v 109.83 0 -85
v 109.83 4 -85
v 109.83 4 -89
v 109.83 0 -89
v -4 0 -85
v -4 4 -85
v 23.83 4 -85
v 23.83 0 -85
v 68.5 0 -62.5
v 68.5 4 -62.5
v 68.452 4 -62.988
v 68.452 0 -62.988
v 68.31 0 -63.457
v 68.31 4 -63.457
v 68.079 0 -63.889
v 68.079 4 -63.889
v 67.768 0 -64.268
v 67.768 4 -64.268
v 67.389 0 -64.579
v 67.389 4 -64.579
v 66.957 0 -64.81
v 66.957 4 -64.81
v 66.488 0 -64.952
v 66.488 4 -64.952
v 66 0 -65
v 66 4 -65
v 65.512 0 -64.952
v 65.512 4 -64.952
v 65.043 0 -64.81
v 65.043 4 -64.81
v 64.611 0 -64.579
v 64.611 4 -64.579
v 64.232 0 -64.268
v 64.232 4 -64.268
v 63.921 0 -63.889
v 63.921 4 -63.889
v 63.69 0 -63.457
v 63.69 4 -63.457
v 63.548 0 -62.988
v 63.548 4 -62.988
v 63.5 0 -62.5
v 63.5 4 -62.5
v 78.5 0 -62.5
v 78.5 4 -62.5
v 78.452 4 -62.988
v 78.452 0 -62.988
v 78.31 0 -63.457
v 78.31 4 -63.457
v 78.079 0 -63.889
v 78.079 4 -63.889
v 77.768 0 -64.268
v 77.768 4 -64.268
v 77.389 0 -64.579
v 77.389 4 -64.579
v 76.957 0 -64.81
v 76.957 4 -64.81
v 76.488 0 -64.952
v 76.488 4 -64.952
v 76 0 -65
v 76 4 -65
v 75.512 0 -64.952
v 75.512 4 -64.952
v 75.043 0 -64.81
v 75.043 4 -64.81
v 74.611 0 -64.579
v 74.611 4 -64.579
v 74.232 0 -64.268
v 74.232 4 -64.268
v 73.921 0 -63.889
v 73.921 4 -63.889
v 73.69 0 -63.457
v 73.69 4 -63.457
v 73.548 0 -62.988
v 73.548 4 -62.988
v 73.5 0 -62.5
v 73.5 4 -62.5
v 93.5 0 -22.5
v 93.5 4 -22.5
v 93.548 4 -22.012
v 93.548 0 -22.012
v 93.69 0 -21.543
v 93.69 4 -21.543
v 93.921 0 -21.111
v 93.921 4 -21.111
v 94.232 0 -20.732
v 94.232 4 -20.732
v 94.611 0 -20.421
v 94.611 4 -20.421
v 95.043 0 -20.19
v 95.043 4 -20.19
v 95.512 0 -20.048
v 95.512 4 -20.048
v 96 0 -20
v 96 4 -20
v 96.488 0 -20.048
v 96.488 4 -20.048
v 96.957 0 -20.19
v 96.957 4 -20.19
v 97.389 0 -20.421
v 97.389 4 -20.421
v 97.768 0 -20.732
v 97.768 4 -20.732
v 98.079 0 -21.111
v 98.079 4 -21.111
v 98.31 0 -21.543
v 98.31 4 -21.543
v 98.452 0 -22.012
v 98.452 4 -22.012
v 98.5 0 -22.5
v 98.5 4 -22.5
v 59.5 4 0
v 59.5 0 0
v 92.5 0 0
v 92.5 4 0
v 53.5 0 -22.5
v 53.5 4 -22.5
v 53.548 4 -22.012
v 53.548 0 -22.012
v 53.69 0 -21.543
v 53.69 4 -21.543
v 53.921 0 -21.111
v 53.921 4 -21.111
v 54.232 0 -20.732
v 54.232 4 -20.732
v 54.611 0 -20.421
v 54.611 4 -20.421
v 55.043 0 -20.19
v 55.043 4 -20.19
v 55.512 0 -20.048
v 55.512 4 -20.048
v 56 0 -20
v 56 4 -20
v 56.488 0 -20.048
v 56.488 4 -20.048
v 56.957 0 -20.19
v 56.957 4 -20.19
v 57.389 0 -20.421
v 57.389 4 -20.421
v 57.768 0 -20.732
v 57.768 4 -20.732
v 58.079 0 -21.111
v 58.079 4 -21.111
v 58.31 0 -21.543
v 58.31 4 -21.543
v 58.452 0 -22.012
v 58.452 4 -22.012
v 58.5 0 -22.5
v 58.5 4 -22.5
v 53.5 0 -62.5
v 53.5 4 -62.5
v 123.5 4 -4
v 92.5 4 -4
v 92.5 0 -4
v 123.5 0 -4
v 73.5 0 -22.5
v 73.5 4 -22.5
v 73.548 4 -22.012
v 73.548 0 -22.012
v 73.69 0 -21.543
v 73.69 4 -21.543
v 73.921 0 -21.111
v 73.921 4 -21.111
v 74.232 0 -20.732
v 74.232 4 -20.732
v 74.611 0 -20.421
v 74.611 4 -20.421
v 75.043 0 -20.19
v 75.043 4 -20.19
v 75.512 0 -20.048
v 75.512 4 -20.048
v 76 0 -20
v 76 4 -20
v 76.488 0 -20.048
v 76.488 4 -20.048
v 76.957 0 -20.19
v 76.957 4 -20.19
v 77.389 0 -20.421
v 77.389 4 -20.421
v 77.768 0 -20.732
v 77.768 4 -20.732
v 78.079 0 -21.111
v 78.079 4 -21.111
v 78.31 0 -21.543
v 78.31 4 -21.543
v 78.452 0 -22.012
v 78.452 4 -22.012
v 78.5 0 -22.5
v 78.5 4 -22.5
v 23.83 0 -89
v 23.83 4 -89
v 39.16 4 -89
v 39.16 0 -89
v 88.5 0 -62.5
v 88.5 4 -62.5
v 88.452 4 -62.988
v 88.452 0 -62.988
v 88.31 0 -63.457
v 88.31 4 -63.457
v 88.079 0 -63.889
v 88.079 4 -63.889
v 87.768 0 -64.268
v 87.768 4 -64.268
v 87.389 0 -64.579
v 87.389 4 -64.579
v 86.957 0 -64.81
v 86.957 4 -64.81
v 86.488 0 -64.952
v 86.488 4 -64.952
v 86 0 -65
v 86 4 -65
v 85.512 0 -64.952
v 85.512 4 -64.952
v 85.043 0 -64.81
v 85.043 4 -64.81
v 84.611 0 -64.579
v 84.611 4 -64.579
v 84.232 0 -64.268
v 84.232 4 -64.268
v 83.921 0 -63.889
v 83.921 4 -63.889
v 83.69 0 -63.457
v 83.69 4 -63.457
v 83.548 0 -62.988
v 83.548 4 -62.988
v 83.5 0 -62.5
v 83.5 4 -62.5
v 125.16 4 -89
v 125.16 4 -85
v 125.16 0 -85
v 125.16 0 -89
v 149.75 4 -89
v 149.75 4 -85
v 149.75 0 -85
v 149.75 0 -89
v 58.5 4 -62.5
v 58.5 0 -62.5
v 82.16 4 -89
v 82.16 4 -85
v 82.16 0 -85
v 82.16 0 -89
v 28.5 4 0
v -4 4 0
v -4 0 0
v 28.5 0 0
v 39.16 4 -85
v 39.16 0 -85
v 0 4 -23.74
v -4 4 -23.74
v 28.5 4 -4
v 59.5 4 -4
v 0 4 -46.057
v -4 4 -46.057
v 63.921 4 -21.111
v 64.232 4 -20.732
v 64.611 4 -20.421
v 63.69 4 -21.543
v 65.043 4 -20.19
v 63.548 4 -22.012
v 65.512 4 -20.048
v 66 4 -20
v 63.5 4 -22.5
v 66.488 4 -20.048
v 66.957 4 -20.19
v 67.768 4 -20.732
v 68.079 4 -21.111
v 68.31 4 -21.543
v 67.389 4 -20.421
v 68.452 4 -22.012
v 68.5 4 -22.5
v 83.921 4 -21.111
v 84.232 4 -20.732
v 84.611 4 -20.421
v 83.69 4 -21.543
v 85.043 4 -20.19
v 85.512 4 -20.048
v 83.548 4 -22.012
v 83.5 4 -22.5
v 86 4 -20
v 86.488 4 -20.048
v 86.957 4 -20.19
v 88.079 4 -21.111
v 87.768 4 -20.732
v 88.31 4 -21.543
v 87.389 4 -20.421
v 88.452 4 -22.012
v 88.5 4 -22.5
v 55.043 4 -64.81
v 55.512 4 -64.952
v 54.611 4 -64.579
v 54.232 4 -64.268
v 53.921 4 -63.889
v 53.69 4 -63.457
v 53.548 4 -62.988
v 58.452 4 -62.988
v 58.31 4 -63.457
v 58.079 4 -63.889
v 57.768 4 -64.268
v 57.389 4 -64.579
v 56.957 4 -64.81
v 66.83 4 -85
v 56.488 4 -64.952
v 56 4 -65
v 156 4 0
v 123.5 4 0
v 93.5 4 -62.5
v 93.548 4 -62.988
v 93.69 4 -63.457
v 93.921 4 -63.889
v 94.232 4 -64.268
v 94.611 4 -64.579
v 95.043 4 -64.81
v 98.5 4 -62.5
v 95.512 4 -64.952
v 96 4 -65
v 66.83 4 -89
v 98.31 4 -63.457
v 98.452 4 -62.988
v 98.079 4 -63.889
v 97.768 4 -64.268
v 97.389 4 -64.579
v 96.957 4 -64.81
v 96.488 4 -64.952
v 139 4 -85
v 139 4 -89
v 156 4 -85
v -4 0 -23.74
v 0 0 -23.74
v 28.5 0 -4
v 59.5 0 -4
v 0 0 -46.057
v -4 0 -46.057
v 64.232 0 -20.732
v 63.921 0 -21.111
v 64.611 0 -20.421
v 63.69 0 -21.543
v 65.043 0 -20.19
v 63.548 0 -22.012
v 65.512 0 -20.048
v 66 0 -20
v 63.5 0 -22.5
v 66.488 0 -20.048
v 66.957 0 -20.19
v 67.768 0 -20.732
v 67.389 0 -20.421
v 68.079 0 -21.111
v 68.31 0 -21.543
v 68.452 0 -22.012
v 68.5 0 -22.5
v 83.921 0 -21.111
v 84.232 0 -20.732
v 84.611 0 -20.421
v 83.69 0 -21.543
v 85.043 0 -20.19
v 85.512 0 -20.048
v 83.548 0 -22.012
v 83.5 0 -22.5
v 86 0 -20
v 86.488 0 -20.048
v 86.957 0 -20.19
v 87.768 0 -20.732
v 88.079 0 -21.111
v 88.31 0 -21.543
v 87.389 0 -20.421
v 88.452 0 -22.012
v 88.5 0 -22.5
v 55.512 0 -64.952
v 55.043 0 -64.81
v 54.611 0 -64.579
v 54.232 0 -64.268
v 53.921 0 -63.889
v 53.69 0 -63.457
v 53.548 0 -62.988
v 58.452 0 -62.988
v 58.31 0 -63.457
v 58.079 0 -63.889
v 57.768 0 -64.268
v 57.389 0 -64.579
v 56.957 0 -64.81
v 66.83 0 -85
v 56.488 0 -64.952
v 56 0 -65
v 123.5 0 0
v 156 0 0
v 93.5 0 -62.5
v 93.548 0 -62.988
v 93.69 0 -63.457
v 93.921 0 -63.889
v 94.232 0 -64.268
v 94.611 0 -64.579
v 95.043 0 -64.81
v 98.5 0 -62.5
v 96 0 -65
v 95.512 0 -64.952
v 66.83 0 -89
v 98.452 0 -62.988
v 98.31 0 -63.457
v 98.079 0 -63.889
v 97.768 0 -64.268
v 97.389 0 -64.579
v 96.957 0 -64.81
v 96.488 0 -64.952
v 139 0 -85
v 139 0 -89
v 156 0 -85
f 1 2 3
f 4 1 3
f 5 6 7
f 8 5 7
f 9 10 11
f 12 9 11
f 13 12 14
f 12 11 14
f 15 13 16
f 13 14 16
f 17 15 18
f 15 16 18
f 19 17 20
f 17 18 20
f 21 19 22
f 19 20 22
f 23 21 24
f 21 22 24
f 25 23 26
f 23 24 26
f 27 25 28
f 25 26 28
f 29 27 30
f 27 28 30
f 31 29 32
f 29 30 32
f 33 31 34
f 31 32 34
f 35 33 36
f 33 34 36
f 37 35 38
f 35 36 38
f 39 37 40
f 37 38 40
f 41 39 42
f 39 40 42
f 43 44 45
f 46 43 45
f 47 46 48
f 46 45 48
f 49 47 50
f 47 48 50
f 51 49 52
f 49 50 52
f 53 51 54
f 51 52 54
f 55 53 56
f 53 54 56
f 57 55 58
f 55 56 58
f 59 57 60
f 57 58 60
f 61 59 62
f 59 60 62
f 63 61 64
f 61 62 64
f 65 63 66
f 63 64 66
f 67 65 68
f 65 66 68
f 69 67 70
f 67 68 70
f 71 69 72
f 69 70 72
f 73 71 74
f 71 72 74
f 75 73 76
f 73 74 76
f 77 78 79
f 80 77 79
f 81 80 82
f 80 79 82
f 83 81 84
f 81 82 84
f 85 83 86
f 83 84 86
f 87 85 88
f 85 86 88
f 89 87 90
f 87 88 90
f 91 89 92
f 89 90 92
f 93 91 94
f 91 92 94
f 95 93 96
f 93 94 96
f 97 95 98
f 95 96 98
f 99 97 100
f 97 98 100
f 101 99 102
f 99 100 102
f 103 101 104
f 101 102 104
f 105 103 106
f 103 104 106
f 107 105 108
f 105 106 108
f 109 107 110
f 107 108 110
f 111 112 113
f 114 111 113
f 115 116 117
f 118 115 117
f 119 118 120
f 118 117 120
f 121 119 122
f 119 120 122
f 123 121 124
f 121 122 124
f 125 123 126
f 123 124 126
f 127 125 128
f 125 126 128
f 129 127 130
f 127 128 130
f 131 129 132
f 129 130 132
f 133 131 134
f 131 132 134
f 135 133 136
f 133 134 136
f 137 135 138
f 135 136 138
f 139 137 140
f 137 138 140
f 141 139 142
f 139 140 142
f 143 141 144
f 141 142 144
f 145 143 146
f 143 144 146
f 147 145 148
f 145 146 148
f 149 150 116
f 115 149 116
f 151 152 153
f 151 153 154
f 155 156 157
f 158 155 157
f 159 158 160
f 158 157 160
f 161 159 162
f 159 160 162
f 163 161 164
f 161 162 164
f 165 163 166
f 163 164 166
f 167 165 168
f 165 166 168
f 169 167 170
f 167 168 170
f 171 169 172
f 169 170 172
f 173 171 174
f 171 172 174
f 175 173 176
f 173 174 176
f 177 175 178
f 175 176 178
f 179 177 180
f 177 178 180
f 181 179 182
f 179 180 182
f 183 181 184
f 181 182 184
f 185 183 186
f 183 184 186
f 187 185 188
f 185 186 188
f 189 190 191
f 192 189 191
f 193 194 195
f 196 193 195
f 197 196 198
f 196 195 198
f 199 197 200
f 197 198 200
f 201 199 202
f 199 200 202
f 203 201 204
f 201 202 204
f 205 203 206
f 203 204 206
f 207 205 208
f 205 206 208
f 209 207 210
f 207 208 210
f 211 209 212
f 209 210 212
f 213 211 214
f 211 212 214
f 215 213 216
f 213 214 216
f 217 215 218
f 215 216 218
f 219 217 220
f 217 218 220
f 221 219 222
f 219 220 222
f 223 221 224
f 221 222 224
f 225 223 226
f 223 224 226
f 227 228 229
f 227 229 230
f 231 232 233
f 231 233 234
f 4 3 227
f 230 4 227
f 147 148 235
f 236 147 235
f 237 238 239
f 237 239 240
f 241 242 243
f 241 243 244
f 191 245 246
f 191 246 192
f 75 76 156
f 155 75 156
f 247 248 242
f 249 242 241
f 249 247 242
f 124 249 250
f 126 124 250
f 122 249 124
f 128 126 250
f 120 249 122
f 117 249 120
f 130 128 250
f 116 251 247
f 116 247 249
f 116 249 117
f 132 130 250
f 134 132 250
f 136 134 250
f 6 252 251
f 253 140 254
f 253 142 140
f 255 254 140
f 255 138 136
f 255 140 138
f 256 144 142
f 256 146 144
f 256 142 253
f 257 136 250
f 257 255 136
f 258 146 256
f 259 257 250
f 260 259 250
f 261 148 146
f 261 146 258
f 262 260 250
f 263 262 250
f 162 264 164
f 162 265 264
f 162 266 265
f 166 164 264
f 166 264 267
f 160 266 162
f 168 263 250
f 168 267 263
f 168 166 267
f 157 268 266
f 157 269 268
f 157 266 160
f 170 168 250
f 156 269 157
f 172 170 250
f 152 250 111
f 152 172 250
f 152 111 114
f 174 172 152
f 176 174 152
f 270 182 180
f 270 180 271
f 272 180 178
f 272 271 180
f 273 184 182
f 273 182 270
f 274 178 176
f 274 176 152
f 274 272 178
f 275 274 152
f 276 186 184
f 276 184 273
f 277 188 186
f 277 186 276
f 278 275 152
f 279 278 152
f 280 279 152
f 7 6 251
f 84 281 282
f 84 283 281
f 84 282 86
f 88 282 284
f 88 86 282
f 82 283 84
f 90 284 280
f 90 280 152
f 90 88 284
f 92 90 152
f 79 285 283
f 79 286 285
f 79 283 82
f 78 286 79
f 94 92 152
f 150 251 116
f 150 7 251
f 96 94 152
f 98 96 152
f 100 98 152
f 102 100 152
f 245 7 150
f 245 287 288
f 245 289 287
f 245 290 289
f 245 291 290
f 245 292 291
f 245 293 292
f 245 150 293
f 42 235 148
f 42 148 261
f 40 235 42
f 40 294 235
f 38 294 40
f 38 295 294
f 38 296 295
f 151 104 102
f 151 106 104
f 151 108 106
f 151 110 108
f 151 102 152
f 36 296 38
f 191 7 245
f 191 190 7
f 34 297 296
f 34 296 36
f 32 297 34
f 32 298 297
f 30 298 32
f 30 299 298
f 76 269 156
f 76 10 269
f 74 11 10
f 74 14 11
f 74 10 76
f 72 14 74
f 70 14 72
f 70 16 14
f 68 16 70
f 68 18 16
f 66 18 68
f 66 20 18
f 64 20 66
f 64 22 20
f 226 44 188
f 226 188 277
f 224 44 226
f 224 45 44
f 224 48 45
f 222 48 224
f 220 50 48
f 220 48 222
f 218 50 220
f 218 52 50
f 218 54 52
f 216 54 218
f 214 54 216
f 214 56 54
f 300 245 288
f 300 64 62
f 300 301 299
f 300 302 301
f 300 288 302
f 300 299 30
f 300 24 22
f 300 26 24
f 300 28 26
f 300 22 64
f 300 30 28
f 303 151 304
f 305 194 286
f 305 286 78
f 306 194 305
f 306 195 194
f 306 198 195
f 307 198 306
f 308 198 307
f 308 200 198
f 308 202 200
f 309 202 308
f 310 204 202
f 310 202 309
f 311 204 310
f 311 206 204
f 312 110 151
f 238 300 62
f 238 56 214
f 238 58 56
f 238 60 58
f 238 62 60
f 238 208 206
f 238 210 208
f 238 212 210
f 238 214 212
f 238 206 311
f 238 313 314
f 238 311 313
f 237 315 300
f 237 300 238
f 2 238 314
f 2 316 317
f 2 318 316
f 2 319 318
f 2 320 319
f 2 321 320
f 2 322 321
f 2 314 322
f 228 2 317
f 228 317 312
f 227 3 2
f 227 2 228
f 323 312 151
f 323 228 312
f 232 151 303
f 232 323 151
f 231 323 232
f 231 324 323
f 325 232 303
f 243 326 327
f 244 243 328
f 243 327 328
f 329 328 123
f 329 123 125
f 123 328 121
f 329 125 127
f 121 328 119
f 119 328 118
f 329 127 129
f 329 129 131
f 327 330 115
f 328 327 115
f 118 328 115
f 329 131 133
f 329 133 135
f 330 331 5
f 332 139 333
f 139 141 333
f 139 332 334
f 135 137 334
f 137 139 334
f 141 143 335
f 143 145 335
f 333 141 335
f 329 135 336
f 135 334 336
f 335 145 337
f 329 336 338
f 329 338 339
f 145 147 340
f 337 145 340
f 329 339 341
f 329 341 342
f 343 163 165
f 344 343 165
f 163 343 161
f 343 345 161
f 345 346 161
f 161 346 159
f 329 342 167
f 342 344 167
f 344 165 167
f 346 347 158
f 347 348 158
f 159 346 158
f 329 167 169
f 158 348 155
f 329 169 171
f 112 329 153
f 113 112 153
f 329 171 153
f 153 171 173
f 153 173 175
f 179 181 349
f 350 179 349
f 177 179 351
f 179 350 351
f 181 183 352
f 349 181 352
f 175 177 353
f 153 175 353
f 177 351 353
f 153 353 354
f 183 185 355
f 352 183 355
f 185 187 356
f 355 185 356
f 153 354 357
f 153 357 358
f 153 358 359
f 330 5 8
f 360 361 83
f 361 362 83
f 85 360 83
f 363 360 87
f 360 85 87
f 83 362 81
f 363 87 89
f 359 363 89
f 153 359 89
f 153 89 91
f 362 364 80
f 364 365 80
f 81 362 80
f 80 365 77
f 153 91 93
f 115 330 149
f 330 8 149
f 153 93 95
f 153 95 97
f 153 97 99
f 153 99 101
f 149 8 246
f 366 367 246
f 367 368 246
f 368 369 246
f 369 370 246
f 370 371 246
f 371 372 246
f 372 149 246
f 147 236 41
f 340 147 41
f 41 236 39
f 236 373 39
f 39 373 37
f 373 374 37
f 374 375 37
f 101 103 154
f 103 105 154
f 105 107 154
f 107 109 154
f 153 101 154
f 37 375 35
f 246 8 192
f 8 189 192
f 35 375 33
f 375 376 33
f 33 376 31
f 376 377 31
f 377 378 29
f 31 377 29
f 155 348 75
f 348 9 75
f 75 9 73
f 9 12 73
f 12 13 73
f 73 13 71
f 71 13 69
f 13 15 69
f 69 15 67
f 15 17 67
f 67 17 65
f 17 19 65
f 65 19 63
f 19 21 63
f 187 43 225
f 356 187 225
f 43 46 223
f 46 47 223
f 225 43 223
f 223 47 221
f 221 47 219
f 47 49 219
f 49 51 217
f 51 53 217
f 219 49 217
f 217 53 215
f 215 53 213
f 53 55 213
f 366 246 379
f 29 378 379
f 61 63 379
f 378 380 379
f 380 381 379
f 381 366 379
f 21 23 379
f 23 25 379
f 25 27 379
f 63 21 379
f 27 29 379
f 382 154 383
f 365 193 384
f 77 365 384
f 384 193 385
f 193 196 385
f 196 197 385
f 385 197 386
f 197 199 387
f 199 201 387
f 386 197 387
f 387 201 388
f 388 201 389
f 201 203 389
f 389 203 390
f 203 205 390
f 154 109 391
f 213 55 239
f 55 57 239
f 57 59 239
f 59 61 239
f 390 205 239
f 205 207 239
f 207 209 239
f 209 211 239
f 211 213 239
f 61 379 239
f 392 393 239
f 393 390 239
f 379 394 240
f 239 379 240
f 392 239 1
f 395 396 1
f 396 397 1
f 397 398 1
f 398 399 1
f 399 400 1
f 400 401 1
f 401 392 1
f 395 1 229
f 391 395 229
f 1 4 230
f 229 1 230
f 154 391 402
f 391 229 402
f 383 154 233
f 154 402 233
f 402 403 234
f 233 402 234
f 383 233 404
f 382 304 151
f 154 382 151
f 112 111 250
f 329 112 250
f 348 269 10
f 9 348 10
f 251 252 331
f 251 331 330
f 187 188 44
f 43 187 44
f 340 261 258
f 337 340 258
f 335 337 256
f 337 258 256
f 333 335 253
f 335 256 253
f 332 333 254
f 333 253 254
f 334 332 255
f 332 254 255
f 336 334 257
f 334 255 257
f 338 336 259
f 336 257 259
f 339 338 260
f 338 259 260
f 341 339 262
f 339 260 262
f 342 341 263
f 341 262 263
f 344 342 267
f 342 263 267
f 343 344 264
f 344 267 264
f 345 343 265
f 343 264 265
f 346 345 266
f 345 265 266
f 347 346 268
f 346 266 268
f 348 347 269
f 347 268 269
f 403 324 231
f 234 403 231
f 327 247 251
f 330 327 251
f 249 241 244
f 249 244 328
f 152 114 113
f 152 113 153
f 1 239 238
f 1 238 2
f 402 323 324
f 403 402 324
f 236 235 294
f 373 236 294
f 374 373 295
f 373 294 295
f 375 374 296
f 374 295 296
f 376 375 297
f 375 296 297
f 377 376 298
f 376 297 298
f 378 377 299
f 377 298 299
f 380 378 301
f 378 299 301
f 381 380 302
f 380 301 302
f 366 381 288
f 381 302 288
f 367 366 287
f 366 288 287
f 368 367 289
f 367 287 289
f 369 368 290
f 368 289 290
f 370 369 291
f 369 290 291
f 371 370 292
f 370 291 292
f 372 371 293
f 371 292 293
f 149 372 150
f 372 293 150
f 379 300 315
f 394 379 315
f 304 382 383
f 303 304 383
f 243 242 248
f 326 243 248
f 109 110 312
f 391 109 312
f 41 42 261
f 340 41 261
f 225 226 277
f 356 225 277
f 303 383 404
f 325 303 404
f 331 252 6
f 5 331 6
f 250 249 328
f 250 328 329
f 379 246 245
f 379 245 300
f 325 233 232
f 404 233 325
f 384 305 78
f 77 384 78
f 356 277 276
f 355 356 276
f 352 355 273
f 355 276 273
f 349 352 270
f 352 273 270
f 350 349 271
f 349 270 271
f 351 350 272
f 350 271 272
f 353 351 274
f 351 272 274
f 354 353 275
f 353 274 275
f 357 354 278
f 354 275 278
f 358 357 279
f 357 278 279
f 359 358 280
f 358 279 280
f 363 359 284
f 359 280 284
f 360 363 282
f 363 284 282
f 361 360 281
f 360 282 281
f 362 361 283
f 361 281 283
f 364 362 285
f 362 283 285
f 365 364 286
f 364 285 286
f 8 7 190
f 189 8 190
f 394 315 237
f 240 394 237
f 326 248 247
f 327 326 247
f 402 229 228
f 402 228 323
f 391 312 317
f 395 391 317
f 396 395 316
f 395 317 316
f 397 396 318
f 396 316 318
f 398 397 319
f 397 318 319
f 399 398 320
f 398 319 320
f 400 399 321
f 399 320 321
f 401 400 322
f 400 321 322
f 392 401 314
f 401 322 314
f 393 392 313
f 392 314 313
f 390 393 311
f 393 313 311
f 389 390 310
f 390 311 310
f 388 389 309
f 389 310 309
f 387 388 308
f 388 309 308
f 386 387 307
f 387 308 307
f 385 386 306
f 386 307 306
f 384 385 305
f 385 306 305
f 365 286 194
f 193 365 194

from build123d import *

# Parameters (mm, degrees)
SKETCH1_W           = 156
SKETCH1_H           = 85
BOSS_EXTRUDE1_DEPTH = 4
SKETCH2_W           = 15.33
SKETCH2_H           = 4
BOSS_EXTRUDE2_DEPTH = 4
SKETCH3_W           = 31
SKETCH3_H           = 4
CUT_EXTRUDE2_DEPTH  = 4
SKETCH4_W           = 4
SKETCH4_H           = 26.74
SKETCH4_H_2         = 28.24
BOSS_EXTRUDE3_DEPTH = 4
SKETCH5_W           = 10.75
SKETCH5_H           = 4
BOSS_EXTRUDE4_DEPTH = 4
CUT_EXTRUDE3_DEPTH  = 4
SKETCH7_W           = 4
SKETCH7_H           = 8.78
SKETCH7_H_2         = 1.92320958
BOSS_EXTRUDE5_DEPTH = 4
SKETCH8_W           = 4
SKETCH8_H           = 2.999936799
CUT_EXTRUDE4_DEPTH  = 4


with BuildPart() as part:
    # Sketch1 → Boss-Extrude1 (new body)
    with BuildSketch(Plane(origin=(0, 0, 0), x_dir=(1, 0, 0), z_dir=(0, 1, 0))):
        with Locations((78, 42.5)):
            Rectangle(SKETCH1_W, SKETCH1_H)
    extrude(amount=BOSS_EXTRUDE1_DEPTH)

    # Sketch2 → Boss-Extrude2 (add)
    with BuildSketch(Plane(origin=(0, 4, 0), x_dir=(1, 0, 0), z_dir=(0, 1, 0))):
        with Locations((31.495, 87)):
            Rectangle(SKETCH2_W, SKETCH2_H)
        with Locations((74.495, 87)):
            Rectangle(SKETCH2_W, SKETCH2_H)
        with Locations((117.495, 87)):
            Rectangle(SKETCH2_W, SKETCH2_H)
    extrude(amount=-BOSS_EXTRUDE2_DEPTH)

    # Sketch3 → Cut-Extrude2 (cut)
    with BuildSketch(Plane(origin=(0, 4, 0), x_dir=(1, 0, 0), z_dir=(0, 1, 0))):
        with Locations((44, 2)):
            Rectangle(SKETCH3_W, SKETCH3_H)
        with Locations((108, 2)):
            Rectangle(SKETCH3_W, SKETCH3_H)
    extrude(amount=-CUT_EXTRUDE2_DEPTH, mode=Mode.SUBTRACT)

    # Sketch4 → Boss-Extrude3 (add)
    with BuildSketch(Plane(origin=(0, 4, 0), x_dir=(1, 0, 0), z_dir=(0, 1, 0))):
        with Locations((-2, 13.37)):
            Rectangle(SKETCH4_W, SKETCH4_H)
        with Locations((-2, 62.1)):
            Rectangle(SKETCH4_W, SKETCH4_H_2)
    extrude(amount=-BOSS_EXTRUDE3_DEPTH)

    # Sketch5 → Boss-Extrude4 (add)
    with BuildSketch(Plane(origin=(0, 4, 0), x_dir=(1, 0, 0), z_dir=(0, 1, 0))):
        with Locations((144.375, 87)):
            Rectangle(SKETCH5_W, SKETCH5_H)
    extrude(amount=-BOSS_EXTRUDE4_DEPTH)

    # Sketch6 → Cut-Extrude3 (cut)
    with BuildSketch(Plane(origin=(0, 4, 0), x_dir=(1, 0, 0), z_dir=(0, 1, 0))):
        with BuildLine():
            Line((68.5, 22.5), (68.5, 62.5))
            ThreePointArc((68.5, 62.5), (66, 65), (63.5, 62.5))
            Line((63.5, 62.5), (63.5, 22.5))
            ThreePointArc((63.5, 22.5), (66, 20), (68.5, 22.5))
        make_face()
        with BuildLine():
            Line((58.5, 22.5), (58.5, 62.5))
            ThreePointArc((58.5, 62.5), (56, 65), (53.5, 62.5))
            Line((53.5, 62.5), (53.5, 22.5))
            ThreePointArc((53.5, 22.5), (56, 20), (58.5, 22.5))
        make_face()
        with BuildLine():
            Line((78.5, 22.5), (78.5, 62.5))
            ThreePointArc((78.5, 62.5), (76, 65), (73.5, 62.5))
            Line((73.5, 62.5), (73.5, 22.5))
            ThreePointArc((73.5, 22.5), (76, 20), (78.5, 22.5))
        make_face()
        with BuildLine():
            Line((88.5, 22.5), (88.5, 62.5))
            ThreePointArc((88.5, 62.5), (86, 65), (83.5, 62.5))
            Line((83.5, 62.5), (83.5, 22.5))
            ThreePointArc((83.5, 22.5), (86, 20), (88.5, 22.5))
        make_face()
        with BuildLine():
            Line((98.5, 22.5), (98.5, 62.5))
            ThreePointArc((98.5, 62.5), (96, 65), (93.5, 62.5))
            Line((93.5, 62.5), (93.5, 22.5))
            ThreePointArc((93.5, 22.5), (96, 20), (98.5, 22.5))
        make_face()
    extrude(amount=-CUT_EXTRUDE3_DEPTH, mode=Mode.SUBTRACT)

    # Sketch7 → Boss-Extrude5 (add)
    with BuildSketch(Plane(origin=(0, 4, 0), x_dir=(1, 0, 0), z_dir=(0, 1, 0))):
        with Locations((-2, 80.61)):
            Rectangle(SKETCH7_W, SKETCH7_H)
        with Locations((-2, 47.01839521)):
            Rectangle(SKETCH7_W, SKETCH7_H_2)
    extrude(amount=-BOSS_EXTRUDE5_DEPTH)

    # Sketch8 → Cut-Extrude4 (cut)
    with BuildSketch(Plane(origin=(0, 4, 0), x_dir=(1, 0, 0), z_dir=(0, 1, 0))):
        with Locations((-2, 25.240031601)):
            Rectangle(SKETCH8_W, SKETCH8_H)
    extrude(amount=-CUT_EXTRUDE4_DEPTH, mode=Mode.SUBTRACT)


solid = part.part
